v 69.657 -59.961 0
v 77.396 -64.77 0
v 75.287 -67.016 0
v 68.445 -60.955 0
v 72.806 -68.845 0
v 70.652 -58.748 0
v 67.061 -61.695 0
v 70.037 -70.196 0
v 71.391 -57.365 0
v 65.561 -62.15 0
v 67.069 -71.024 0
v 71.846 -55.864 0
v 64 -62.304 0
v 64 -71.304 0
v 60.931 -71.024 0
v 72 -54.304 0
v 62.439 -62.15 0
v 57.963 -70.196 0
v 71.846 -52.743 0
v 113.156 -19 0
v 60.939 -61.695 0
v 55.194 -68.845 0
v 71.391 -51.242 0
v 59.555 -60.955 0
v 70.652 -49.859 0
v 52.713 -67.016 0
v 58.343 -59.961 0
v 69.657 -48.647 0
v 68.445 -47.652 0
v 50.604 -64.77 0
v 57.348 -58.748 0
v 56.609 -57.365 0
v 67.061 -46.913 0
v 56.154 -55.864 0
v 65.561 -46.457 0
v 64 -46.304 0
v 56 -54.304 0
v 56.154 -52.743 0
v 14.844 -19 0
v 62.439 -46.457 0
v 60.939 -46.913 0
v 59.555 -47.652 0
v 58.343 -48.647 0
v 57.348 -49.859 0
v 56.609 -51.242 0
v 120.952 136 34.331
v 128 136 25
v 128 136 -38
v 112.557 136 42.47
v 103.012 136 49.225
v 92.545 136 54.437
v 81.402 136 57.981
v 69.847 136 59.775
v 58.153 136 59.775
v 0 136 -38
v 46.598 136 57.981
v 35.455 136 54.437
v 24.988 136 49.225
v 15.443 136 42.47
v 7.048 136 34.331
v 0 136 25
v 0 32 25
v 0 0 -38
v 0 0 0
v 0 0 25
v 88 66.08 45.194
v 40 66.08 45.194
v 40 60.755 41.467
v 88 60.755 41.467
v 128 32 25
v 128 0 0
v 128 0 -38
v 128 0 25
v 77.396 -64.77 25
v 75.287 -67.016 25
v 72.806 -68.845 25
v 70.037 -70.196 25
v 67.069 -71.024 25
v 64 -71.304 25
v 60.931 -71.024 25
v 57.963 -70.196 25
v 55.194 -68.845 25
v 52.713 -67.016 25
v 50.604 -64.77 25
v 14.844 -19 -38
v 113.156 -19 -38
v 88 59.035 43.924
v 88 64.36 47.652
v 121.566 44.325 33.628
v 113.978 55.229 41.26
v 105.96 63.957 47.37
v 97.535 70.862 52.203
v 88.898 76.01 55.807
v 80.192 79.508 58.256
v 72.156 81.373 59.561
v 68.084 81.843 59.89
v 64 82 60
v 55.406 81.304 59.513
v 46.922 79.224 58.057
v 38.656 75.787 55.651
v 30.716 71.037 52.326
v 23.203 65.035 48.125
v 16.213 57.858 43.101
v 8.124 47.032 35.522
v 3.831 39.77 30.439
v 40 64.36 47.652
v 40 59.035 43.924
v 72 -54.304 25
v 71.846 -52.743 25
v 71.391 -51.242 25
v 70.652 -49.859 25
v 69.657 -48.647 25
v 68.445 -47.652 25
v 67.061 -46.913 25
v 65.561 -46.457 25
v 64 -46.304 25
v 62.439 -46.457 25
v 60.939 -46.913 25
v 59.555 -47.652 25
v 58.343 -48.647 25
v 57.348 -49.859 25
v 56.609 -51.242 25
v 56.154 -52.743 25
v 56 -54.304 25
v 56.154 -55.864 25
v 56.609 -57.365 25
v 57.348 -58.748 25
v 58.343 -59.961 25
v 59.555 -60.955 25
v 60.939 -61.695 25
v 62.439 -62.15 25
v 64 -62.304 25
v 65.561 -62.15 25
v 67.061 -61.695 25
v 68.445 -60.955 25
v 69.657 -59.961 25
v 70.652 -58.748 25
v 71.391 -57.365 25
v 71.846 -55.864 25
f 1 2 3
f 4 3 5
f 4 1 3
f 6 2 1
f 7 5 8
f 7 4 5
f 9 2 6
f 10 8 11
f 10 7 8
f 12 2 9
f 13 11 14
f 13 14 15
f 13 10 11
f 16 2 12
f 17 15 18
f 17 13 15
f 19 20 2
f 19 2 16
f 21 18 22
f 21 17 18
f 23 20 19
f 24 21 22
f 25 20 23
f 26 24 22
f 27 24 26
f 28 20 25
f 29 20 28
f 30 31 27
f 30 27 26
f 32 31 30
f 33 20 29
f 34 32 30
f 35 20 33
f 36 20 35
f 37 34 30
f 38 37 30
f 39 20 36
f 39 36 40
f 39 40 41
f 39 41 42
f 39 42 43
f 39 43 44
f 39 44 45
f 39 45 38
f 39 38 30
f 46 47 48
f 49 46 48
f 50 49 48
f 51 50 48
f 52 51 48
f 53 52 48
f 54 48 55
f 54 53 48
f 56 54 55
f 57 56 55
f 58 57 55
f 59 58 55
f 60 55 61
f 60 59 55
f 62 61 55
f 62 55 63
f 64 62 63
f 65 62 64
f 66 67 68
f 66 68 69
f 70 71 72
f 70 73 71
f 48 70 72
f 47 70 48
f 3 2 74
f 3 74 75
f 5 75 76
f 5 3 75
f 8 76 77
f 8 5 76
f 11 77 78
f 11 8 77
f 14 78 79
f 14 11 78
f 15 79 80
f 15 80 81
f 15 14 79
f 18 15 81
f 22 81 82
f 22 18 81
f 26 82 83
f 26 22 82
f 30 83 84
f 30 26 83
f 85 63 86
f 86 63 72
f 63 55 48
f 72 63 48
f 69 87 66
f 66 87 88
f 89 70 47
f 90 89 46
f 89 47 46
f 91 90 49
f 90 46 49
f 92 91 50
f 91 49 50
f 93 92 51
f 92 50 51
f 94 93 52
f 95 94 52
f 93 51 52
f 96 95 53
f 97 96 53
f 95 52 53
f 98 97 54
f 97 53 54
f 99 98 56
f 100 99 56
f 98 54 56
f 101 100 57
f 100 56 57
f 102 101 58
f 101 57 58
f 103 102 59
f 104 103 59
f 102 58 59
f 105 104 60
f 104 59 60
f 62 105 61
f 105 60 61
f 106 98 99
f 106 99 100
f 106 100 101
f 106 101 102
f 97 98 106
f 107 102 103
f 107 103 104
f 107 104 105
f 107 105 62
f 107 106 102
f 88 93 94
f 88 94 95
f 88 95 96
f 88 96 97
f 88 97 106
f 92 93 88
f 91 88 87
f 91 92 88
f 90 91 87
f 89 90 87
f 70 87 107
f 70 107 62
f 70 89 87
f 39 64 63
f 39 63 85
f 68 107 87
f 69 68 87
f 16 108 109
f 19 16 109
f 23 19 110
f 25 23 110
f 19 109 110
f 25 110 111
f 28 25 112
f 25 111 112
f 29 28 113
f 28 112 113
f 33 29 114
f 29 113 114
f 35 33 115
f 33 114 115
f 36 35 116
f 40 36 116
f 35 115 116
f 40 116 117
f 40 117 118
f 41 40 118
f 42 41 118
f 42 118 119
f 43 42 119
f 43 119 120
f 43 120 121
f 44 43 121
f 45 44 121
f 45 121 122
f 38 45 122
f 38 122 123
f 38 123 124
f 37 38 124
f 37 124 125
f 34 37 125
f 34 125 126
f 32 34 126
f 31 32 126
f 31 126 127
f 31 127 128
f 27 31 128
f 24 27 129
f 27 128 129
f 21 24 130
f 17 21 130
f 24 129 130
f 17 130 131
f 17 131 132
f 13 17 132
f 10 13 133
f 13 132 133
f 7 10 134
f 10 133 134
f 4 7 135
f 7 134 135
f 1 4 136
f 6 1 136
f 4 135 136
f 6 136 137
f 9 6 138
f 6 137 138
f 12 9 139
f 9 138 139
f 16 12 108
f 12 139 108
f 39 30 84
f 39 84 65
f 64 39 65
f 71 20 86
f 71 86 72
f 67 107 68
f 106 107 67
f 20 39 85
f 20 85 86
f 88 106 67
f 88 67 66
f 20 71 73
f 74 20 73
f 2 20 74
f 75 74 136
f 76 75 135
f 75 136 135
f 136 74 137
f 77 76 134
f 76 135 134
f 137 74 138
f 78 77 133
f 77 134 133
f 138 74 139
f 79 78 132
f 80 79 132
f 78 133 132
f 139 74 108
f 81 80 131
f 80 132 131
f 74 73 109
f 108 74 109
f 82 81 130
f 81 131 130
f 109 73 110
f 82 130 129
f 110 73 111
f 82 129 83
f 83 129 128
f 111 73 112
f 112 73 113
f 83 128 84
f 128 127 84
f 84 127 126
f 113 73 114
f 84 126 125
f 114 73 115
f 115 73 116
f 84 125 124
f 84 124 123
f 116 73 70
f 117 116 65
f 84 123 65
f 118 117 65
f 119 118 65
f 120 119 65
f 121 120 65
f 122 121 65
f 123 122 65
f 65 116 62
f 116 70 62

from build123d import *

# Parameters (mm, degrees)
EXTRUDE_1_DEPTH     = 25
EXTRUDE_2_DEPTH     = 104
CUT_EXTRUDE_1_DEPTH = 197.163197364
SKETCH_4_W          = 48
SKETCH_4_H          = 6.5
CUT_EXTRUDE_2_DEPTH = 3
SKETCH_5_R          = 8
CUT_EXTRUDE_3_DEPTH = 191.013157439
EXTRUDE_3_DEPTH     = 38


with BuildPart() as part:
    # Эскиз1 → Бобышка-Вытянуть1 (new body)
    with BuildSketch(Plane.XY):
        with BuildLine():
            Line((0, 0), (0, 136))
            Line((0, 136), (128, 136))
            Line((128, 136), (128, 0))
            Line((128, 0), (77.396182811, -64.769932368))
            ThreePointArc((77.396182811, -64.769932368), (64, -71.303687287), (50.603817189, -64.769932368))
            Line((50.603817189, -64.769932368), (0, 0))
        make_face()
    extrude(amount=EXTRUDE_1_DEPTH)

    # Эскиз2 → Бобышка-Вытянуть2 (add)
    with BuildSketch(Plane(origin=(0, 136, 0), x_dir=(1, 0, 0), z_dir=(0, 1, 0))):
        with BuildLine():
            Line((0, -25), (128, -25))
            ThreePointArc((128, -25), (64, -60), (0, -25))
        make_face()
    extrude(amount=-EXTRUDE_2_DEPTH)

    # Эскиз3 → Вырез-Вытянуть1 (cut, through all)
    with BuildSketch(Plane(origin=(128, 0, 0), x_dir=(0, 0, -1), z_dir=(1, 0, 0))):
        Polygon((-25, 32), (-60, 32), (-60, 82), align=None)
    extrude(amount=-CUT_EXTRUDE_1_DEPTH, mode=Mode.SUBTRACT)

    # Эскиз4 → Вырез-Вытянуть2 (cut)
    with BuildSketch(Plane(origin=(0, -1.22147651, 1.744966443), x_dir=(1, 0, 0), z_dir=(0, -0.5734623443633285, 0.8192319205190403))):
        with Locations((64, 76.801980066)):
            Rectangle(SKETCH_4_W, SKETCH_4_H)
    extrude(amount=-CUT_EXTRUDE_2_DEPTH, mode=Mode.SUBTRACT)

    # Эскиз5 → Вырез-Вытянуть3 (cut, through all)
    with BuildSketch(Plane.XY.offset(25)):
        with Locations((64, -54.303687287)):
            Circle(SKETCH_5_R)
    extrude(amount=-CUT_EXTRUDE_3_DEPTH, mode=Mode.SUBTRACT)

    # Эскиз6 → Бобышка-Вытянуть3 (add)
    with BuildSketch(Plane(origin=(0, 0, 0), x_dir=(-1, 0, 0), z_dir=(0, 0, -1))):
        Polygon((-128, 136), (0, 136), (0, 0), (-14.844426904, -19), (-113.155573096, -19), (-128, 0), align=None)
    extrude(amount=EXTRUDE_3_DEPTH)


solid = part.part
